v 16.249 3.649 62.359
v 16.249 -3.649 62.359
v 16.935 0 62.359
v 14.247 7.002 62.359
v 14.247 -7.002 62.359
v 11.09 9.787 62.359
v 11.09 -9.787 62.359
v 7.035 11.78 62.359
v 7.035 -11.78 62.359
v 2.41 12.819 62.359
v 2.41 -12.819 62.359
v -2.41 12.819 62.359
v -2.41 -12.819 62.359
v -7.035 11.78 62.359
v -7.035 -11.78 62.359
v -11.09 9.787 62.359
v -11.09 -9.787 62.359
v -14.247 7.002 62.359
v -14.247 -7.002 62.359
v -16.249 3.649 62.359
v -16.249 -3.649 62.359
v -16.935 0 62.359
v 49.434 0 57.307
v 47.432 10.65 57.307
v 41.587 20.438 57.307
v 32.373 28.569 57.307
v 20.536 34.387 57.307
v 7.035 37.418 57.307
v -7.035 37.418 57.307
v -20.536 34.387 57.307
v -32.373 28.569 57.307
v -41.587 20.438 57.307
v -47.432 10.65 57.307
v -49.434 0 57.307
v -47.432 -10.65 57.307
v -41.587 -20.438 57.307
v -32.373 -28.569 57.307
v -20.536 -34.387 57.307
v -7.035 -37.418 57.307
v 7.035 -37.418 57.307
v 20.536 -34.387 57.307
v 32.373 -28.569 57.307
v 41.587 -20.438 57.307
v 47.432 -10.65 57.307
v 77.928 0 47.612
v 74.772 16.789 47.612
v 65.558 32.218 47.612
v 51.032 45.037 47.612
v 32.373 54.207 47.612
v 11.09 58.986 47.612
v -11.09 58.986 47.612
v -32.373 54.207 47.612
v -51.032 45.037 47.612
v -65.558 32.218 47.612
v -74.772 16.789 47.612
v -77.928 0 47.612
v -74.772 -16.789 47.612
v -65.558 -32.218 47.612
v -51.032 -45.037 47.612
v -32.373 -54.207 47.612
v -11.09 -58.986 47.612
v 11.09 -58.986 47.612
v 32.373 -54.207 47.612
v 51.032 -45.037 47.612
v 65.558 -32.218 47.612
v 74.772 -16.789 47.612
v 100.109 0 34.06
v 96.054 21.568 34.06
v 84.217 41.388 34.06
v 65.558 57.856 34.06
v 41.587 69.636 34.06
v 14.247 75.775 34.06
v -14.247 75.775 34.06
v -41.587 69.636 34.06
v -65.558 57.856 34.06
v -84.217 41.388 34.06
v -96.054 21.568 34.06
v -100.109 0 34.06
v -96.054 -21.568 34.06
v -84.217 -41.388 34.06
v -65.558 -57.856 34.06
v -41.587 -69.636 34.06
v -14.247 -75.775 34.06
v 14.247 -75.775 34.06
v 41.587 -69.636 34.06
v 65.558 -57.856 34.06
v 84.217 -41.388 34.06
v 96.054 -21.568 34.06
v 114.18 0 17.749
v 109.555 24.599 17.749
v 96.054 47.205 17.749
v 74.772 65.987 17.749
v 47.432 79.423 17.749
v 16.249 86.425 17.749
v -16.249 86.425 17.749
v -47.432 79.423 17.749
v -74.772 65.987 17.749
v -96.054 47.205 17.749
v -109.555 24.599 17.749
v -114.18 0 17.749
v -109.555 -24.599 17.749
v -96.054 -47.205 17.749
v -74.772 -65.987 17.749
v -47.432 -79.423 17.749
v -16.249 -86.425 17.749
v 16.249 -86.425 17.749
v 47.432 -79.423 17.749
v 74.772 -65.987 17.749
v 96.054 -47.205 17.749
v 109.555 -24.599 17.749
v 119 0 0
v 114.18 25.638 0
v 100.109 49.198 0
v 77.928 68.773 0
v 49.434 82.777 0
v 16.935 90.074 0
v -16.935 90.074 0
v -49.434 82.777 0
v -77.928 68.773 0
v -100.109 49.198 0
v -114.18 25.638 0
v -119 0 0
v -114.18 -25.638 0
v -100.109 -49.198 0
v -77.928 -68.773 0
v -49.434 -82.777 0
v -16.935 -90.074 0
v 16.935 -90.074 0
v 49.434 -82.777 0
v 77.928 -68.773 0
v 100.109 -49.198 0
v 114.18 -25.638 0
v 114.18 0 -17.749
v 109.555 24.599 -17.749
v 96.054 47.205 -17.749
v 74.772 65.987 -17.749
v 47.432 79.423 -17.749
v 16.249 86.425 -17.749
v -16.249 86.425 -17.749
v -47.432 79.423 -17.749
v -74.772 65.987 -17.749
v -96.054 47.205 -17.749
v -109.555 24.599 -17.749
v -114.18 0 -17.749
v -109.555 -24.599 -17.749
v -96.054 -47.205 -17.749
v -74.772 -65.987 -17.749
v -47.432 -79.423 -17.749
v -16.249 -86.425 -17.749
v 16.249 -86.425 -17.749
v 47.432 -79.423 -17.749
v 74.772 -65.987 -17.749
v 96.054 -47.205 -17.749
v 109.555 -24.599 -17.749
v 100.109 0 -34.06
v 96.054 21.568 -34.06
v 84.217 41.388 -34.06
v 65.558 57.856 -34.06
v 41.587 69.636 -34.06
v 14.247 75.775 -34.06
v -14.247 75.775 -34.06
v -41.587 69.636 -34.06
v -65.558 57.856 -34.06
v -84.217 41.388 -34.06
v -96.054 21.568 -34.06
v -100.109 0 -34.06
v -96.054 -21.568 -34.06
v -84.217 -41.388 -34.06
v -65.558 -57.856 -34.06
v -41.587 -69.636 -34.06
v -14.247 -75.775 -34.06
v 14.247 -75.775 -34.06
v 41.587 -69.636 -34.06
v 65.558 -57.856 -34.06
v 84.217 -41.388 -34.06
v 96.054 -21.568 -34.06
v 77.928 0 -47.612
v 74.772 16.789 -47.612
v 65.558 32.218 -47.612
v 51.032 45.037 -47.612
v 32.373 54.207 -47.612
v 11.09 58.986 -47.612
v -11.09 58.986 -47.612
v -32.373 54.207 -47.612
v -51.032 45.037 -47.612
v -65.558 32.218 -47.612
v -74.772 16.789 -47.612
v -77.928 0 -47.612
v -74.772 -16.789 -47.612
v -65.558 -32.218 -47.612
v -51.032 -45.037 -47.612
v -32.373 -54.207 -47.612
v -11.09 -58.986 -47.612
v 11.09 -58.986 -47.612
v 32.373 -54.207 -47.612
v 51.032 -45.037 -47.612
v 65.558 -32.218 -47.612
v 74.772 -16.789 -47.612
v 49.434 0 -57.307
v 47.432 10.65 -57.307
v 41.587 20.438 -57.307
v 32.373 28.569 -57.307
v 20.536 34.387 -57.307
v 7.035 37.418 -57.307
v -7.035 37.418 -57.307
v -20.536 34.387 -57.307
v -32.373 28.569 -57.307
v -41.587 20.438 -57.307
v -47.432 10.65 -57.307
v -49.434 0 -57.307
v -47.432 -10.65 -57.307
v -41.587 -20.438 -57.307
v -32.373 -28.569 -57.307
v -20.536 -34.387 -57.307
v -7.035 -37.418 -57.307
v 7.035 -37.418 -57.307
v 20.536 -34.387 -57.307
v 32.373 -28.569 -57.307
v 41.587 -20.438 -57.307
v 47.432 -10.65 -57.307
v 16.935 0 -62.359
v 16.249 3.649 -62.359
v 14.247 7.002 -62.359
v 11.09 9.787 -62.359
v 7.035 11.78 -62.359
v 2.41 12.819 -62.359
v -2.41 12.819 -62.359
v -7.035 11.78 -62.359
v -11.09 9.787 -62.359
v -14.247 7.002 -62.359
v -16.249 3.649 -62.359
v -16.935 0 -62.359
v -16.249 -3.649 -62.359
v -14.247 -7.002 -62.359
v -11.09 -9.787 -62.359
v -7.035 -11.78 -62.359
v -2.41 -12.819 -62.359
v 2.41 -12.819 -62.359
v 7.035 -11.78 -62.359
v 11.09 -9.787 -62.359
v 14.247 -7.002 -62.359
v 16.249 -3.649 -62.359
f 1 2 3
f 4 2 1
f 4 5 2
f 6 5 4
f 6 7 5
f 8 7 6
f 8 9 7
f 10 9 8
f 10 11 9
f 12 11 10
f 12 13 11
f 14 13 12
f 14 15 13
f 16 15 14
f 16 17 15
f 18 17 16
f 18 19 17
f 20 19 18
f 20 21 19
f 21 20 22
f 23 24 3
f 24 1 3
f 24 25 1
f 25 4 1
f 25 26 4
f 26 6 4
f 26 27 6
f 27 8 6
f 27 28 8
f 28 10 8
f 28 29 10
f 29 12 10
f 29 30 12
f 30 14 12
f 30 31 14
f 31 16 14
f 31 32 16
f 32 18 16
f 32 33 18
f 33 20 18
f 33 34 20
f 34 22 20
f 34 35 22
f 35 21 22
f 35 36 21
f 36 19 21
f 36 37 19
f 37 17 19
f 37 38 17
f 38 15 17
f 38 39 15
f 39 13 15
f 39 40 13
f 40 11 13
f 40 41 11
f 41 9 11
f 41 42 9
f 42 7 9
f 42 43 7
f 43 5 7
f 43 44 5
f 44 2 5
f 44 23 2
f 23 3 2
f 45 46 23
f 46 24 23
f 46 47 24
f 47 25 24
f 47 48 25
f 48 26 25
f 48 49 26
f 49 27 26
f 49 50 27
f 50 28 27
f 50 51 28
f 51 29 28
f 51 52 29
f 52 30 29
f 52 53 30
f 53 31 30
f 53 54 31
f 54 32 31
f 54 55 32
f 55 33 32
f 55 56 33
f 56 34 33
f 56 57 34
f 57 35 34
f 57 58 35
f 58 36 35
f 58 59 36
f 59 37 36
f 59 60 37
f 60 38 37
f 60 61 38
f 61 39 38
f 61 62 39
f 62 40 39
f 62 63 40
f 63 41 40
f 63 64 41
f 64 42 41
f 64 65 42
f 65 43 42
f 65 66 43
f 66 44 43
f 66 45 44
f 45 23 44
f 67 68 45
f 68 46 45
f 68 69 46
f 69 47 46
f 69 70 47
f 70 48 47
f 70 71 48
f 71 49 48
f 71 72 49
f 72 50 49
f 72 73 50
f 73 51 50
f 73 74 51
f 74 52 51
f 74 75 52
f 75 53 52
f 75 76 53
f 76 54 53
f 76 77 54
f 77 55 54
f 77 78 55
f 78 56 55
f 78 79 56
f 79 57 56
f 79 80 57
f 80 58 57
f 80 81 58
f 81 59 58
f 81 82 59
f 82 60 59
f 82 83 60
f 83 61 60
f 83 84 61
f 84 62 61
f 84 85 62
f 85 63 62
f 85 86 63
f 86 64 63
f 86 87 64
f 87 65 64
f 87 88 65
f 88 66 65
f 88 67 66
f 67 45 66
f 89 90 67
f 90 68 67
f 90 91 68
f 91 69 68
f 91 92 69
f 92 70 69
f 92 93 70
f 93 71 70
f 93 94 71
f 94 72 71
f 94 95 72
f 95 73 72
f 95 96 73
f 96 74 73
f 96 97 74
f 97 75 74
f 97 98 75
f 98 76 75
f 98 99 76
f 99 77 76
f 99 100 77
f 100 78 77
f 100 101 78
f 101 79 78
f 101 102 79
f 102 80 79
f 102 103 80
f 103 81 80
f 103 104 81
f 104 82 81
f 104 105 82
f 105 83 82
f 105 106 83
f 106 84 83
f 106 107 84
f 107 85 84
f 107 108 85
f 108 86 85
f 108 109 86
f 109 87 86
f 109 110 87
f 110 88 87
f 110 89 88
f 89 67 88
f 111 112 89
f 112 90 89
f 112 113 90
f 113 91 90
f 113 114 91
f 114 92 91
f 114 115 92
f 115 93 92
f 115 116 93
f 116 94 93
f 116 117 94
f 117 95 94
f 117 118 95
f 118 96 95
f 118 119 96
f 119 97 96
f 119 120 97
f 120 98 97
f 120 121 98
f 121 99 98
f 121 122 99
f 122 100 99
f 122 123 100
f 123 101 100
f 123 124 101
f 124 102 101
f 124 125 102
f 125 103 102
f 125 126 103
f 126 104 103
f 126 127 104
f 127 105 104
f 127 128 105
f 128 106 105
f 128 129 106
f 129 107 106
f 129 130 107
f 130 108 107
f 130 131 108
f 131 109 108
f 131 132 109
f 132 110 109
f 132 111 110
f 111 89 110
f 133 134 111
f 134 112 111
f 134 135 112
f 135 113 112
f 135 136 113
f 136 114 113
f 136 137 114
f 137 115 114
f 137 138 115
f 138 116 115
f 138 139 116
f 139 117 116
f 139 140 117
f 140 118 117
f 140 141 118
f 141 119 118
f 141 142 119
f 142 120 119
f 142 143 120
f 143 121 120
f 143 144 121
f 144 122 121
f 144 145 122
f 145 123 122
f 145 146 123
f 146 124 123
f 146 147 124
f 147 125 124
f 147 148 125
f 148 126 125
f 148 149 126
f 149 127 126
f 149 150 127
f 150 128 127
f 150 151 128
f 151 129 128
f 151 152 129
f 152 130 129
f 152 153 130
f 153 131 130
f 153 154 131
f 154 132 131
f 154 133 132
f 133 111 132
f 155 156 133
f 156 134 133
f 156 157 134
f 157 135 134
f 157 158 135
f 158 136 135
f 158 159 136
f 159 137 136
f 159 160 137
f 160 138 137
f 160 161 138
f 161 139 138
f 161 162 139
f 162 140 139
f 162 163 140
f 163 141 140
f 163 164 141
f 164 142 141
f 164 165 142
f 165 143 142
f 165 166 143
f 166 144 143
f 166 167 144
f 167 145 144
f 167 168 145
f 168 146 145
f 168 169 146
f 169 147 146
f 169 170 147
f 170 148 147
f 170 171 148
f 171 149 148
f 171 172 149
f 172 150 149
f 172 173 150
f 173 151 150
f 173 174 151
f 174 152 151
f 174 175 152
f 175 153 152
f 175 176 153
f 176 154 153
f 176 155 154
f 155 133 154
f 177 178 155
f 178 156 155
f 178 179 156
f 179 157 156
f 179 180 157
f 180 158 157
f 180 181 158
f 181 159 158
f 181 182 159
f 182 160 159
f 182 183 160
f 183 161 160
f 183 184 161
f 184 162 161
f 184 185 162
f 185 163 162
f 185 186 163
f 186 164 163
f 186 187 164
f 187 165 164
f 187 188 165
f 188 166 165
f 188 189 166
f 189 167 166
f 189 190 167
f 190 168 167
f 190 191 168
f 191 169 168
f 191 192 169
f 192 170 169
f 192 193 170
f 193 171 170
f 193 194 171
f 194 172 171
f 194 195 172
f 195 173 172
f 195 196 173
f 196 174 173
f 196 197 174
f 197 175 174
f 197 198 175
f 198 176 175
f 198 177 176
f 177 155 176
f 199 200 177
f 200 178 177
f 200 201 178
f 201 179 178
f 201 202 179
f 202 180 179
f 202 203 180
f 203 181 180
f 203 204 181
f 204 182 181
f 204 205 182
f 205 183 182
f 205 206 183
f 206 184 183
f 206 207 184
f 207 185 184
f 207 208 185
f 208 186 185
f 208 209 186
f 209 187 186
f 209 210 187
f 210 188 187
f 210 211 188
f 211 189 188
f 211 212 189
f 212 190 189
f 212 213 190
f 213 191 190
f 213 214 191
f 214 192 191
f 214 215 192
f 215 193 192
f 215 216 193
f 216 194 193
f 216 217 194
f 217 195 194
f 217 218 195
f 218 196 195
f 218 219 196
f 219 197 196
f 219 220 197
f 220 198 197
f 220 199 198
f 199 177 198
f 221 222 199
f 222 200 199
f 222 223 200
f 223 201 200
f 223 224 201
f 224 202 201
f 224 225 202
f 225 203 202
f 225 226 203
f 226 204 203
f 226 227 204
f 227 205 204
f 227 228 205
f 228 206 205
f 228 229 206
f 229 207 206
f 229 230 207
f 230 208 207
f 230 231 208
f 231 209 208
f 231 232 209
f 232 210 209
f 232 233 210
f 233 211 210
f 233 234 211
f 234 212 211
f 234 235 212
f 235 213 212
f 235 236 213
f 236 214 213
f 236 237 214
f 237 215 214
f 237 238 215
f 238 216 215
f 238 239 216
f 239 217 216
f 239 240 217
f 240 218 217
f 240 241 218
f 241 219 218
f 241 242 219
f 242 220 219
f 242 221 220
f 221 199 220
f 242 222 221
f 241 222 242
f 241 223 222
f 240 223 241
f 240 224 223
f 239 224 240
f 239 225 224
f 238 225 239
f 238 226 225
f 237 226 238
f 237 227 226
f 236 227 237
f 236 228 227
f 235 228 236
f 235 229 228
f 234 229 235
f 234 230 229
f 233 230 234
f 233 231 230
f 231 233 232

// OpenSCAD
// Generated by SolidPython 1.0.1 on 2020-07-29 00:46:53


scale(v = [17, 13, 9]) {
	sphere(r = 7);
}
/***********************************************
*********      SolidPython code:      **********
************************************************
 
# import packages: SolidPython
from solid import *
from solid.utils import *
from itertools import chain, combinations, permutations


class Resize:

    def __init__(self, scad_file):
        self.scad_file = scad_file
        #self.scad_file = import_scad(scad_file)
        # cone/cylinder param:
        self.r1 = 0
        self.r2 = 0
        self.h = 0
        # rectangular prism param:
        self.w = 0
        self.l = 0
        # ellipse param:
        self.r = 0

    # import OpenScad code (file name corresponds to shape)


    # classify shape + parameters
    def assign(self, param1, param2, param3):
        if self.scad_file == 'cone.scad':
            self.r1 = param1
            self.r2 = param2
            self.h = param3
        elif self.scad_file == 'cylinder.scad':
            self.r1 = param1
            self.r2 = param2
            self.h = param3
        elif self.scad_file == 'rectangularPrism.scad':
            self.h = param1
            self.l = param2
            self.w = param3
        else:
            self.r = param1
            self.h = param2

    # resize parameters
    def iterate(self):
        x = range(3, 20, 2)
        i = 1
        if self.scad_file == 'cone.scad':
            tempList = list(permutations(x, 2))
            for temp in tempList:
                param1 = temp[0]
                param2 = temp[1]
                filepath = 'produced_scad_files/' + 'cone' + str(param1) + '_' + str(param2) + '_' + '.scad'
                scad_render_to_file(cylinder(h=param1, r1=param2, r2=0), filepath)

        elif self.scad_file == 'cylinder.scad':
            tempList = list(permutations(x, 3))
            for temp in tempList:
                param1 = temp[0]
                param2 = temp[1]
                filepath = 'produced_scad_files/' + 'cylinder' + str(param1) + '_' + str(param2) + '_' + '.scad'
                scad_render_to_file(cylinder(h=param1, r1=param2, r2=param2), filepath)

        elif self.scad_file == 'rectangularPrism.scad':
            tempList = list(permutations(x, 3))
            for temp in tempList:
                param1 = temp[0]
                param2 = temp[1]
                param3 = temp[2]
                filepath = 'produced_scad_files/' + 'rectangularPrism' + str(param1) + '_' + str(param2) + '_' + str(
                    param3) + '.scad'
                scad_render_to_file(cube(size=(param1, param2, param3)), filepath)

        elif self.scad_file == 'ellipse.scad':
            tempList = list(permutations(x, 4))
            for temp in tempList:
                param1 = temp[0]
                param2 = temp[1]
                param3 = temp[2]
                param4 = temp[3]
                filepath = 'produced_scad_files/' + 'ellipse' + str(param1) + '_' + str(param2) + '_' + str(param3) + '_' + str(param4) + '.scad'
                scad_render_to_file(scale([param1, param2, param3])(sphere(r=param4)), filepath)

    def render_to_scadfile(self):
        scad_render_to_file(scad, 'example.scad') 
 
************************************************/
